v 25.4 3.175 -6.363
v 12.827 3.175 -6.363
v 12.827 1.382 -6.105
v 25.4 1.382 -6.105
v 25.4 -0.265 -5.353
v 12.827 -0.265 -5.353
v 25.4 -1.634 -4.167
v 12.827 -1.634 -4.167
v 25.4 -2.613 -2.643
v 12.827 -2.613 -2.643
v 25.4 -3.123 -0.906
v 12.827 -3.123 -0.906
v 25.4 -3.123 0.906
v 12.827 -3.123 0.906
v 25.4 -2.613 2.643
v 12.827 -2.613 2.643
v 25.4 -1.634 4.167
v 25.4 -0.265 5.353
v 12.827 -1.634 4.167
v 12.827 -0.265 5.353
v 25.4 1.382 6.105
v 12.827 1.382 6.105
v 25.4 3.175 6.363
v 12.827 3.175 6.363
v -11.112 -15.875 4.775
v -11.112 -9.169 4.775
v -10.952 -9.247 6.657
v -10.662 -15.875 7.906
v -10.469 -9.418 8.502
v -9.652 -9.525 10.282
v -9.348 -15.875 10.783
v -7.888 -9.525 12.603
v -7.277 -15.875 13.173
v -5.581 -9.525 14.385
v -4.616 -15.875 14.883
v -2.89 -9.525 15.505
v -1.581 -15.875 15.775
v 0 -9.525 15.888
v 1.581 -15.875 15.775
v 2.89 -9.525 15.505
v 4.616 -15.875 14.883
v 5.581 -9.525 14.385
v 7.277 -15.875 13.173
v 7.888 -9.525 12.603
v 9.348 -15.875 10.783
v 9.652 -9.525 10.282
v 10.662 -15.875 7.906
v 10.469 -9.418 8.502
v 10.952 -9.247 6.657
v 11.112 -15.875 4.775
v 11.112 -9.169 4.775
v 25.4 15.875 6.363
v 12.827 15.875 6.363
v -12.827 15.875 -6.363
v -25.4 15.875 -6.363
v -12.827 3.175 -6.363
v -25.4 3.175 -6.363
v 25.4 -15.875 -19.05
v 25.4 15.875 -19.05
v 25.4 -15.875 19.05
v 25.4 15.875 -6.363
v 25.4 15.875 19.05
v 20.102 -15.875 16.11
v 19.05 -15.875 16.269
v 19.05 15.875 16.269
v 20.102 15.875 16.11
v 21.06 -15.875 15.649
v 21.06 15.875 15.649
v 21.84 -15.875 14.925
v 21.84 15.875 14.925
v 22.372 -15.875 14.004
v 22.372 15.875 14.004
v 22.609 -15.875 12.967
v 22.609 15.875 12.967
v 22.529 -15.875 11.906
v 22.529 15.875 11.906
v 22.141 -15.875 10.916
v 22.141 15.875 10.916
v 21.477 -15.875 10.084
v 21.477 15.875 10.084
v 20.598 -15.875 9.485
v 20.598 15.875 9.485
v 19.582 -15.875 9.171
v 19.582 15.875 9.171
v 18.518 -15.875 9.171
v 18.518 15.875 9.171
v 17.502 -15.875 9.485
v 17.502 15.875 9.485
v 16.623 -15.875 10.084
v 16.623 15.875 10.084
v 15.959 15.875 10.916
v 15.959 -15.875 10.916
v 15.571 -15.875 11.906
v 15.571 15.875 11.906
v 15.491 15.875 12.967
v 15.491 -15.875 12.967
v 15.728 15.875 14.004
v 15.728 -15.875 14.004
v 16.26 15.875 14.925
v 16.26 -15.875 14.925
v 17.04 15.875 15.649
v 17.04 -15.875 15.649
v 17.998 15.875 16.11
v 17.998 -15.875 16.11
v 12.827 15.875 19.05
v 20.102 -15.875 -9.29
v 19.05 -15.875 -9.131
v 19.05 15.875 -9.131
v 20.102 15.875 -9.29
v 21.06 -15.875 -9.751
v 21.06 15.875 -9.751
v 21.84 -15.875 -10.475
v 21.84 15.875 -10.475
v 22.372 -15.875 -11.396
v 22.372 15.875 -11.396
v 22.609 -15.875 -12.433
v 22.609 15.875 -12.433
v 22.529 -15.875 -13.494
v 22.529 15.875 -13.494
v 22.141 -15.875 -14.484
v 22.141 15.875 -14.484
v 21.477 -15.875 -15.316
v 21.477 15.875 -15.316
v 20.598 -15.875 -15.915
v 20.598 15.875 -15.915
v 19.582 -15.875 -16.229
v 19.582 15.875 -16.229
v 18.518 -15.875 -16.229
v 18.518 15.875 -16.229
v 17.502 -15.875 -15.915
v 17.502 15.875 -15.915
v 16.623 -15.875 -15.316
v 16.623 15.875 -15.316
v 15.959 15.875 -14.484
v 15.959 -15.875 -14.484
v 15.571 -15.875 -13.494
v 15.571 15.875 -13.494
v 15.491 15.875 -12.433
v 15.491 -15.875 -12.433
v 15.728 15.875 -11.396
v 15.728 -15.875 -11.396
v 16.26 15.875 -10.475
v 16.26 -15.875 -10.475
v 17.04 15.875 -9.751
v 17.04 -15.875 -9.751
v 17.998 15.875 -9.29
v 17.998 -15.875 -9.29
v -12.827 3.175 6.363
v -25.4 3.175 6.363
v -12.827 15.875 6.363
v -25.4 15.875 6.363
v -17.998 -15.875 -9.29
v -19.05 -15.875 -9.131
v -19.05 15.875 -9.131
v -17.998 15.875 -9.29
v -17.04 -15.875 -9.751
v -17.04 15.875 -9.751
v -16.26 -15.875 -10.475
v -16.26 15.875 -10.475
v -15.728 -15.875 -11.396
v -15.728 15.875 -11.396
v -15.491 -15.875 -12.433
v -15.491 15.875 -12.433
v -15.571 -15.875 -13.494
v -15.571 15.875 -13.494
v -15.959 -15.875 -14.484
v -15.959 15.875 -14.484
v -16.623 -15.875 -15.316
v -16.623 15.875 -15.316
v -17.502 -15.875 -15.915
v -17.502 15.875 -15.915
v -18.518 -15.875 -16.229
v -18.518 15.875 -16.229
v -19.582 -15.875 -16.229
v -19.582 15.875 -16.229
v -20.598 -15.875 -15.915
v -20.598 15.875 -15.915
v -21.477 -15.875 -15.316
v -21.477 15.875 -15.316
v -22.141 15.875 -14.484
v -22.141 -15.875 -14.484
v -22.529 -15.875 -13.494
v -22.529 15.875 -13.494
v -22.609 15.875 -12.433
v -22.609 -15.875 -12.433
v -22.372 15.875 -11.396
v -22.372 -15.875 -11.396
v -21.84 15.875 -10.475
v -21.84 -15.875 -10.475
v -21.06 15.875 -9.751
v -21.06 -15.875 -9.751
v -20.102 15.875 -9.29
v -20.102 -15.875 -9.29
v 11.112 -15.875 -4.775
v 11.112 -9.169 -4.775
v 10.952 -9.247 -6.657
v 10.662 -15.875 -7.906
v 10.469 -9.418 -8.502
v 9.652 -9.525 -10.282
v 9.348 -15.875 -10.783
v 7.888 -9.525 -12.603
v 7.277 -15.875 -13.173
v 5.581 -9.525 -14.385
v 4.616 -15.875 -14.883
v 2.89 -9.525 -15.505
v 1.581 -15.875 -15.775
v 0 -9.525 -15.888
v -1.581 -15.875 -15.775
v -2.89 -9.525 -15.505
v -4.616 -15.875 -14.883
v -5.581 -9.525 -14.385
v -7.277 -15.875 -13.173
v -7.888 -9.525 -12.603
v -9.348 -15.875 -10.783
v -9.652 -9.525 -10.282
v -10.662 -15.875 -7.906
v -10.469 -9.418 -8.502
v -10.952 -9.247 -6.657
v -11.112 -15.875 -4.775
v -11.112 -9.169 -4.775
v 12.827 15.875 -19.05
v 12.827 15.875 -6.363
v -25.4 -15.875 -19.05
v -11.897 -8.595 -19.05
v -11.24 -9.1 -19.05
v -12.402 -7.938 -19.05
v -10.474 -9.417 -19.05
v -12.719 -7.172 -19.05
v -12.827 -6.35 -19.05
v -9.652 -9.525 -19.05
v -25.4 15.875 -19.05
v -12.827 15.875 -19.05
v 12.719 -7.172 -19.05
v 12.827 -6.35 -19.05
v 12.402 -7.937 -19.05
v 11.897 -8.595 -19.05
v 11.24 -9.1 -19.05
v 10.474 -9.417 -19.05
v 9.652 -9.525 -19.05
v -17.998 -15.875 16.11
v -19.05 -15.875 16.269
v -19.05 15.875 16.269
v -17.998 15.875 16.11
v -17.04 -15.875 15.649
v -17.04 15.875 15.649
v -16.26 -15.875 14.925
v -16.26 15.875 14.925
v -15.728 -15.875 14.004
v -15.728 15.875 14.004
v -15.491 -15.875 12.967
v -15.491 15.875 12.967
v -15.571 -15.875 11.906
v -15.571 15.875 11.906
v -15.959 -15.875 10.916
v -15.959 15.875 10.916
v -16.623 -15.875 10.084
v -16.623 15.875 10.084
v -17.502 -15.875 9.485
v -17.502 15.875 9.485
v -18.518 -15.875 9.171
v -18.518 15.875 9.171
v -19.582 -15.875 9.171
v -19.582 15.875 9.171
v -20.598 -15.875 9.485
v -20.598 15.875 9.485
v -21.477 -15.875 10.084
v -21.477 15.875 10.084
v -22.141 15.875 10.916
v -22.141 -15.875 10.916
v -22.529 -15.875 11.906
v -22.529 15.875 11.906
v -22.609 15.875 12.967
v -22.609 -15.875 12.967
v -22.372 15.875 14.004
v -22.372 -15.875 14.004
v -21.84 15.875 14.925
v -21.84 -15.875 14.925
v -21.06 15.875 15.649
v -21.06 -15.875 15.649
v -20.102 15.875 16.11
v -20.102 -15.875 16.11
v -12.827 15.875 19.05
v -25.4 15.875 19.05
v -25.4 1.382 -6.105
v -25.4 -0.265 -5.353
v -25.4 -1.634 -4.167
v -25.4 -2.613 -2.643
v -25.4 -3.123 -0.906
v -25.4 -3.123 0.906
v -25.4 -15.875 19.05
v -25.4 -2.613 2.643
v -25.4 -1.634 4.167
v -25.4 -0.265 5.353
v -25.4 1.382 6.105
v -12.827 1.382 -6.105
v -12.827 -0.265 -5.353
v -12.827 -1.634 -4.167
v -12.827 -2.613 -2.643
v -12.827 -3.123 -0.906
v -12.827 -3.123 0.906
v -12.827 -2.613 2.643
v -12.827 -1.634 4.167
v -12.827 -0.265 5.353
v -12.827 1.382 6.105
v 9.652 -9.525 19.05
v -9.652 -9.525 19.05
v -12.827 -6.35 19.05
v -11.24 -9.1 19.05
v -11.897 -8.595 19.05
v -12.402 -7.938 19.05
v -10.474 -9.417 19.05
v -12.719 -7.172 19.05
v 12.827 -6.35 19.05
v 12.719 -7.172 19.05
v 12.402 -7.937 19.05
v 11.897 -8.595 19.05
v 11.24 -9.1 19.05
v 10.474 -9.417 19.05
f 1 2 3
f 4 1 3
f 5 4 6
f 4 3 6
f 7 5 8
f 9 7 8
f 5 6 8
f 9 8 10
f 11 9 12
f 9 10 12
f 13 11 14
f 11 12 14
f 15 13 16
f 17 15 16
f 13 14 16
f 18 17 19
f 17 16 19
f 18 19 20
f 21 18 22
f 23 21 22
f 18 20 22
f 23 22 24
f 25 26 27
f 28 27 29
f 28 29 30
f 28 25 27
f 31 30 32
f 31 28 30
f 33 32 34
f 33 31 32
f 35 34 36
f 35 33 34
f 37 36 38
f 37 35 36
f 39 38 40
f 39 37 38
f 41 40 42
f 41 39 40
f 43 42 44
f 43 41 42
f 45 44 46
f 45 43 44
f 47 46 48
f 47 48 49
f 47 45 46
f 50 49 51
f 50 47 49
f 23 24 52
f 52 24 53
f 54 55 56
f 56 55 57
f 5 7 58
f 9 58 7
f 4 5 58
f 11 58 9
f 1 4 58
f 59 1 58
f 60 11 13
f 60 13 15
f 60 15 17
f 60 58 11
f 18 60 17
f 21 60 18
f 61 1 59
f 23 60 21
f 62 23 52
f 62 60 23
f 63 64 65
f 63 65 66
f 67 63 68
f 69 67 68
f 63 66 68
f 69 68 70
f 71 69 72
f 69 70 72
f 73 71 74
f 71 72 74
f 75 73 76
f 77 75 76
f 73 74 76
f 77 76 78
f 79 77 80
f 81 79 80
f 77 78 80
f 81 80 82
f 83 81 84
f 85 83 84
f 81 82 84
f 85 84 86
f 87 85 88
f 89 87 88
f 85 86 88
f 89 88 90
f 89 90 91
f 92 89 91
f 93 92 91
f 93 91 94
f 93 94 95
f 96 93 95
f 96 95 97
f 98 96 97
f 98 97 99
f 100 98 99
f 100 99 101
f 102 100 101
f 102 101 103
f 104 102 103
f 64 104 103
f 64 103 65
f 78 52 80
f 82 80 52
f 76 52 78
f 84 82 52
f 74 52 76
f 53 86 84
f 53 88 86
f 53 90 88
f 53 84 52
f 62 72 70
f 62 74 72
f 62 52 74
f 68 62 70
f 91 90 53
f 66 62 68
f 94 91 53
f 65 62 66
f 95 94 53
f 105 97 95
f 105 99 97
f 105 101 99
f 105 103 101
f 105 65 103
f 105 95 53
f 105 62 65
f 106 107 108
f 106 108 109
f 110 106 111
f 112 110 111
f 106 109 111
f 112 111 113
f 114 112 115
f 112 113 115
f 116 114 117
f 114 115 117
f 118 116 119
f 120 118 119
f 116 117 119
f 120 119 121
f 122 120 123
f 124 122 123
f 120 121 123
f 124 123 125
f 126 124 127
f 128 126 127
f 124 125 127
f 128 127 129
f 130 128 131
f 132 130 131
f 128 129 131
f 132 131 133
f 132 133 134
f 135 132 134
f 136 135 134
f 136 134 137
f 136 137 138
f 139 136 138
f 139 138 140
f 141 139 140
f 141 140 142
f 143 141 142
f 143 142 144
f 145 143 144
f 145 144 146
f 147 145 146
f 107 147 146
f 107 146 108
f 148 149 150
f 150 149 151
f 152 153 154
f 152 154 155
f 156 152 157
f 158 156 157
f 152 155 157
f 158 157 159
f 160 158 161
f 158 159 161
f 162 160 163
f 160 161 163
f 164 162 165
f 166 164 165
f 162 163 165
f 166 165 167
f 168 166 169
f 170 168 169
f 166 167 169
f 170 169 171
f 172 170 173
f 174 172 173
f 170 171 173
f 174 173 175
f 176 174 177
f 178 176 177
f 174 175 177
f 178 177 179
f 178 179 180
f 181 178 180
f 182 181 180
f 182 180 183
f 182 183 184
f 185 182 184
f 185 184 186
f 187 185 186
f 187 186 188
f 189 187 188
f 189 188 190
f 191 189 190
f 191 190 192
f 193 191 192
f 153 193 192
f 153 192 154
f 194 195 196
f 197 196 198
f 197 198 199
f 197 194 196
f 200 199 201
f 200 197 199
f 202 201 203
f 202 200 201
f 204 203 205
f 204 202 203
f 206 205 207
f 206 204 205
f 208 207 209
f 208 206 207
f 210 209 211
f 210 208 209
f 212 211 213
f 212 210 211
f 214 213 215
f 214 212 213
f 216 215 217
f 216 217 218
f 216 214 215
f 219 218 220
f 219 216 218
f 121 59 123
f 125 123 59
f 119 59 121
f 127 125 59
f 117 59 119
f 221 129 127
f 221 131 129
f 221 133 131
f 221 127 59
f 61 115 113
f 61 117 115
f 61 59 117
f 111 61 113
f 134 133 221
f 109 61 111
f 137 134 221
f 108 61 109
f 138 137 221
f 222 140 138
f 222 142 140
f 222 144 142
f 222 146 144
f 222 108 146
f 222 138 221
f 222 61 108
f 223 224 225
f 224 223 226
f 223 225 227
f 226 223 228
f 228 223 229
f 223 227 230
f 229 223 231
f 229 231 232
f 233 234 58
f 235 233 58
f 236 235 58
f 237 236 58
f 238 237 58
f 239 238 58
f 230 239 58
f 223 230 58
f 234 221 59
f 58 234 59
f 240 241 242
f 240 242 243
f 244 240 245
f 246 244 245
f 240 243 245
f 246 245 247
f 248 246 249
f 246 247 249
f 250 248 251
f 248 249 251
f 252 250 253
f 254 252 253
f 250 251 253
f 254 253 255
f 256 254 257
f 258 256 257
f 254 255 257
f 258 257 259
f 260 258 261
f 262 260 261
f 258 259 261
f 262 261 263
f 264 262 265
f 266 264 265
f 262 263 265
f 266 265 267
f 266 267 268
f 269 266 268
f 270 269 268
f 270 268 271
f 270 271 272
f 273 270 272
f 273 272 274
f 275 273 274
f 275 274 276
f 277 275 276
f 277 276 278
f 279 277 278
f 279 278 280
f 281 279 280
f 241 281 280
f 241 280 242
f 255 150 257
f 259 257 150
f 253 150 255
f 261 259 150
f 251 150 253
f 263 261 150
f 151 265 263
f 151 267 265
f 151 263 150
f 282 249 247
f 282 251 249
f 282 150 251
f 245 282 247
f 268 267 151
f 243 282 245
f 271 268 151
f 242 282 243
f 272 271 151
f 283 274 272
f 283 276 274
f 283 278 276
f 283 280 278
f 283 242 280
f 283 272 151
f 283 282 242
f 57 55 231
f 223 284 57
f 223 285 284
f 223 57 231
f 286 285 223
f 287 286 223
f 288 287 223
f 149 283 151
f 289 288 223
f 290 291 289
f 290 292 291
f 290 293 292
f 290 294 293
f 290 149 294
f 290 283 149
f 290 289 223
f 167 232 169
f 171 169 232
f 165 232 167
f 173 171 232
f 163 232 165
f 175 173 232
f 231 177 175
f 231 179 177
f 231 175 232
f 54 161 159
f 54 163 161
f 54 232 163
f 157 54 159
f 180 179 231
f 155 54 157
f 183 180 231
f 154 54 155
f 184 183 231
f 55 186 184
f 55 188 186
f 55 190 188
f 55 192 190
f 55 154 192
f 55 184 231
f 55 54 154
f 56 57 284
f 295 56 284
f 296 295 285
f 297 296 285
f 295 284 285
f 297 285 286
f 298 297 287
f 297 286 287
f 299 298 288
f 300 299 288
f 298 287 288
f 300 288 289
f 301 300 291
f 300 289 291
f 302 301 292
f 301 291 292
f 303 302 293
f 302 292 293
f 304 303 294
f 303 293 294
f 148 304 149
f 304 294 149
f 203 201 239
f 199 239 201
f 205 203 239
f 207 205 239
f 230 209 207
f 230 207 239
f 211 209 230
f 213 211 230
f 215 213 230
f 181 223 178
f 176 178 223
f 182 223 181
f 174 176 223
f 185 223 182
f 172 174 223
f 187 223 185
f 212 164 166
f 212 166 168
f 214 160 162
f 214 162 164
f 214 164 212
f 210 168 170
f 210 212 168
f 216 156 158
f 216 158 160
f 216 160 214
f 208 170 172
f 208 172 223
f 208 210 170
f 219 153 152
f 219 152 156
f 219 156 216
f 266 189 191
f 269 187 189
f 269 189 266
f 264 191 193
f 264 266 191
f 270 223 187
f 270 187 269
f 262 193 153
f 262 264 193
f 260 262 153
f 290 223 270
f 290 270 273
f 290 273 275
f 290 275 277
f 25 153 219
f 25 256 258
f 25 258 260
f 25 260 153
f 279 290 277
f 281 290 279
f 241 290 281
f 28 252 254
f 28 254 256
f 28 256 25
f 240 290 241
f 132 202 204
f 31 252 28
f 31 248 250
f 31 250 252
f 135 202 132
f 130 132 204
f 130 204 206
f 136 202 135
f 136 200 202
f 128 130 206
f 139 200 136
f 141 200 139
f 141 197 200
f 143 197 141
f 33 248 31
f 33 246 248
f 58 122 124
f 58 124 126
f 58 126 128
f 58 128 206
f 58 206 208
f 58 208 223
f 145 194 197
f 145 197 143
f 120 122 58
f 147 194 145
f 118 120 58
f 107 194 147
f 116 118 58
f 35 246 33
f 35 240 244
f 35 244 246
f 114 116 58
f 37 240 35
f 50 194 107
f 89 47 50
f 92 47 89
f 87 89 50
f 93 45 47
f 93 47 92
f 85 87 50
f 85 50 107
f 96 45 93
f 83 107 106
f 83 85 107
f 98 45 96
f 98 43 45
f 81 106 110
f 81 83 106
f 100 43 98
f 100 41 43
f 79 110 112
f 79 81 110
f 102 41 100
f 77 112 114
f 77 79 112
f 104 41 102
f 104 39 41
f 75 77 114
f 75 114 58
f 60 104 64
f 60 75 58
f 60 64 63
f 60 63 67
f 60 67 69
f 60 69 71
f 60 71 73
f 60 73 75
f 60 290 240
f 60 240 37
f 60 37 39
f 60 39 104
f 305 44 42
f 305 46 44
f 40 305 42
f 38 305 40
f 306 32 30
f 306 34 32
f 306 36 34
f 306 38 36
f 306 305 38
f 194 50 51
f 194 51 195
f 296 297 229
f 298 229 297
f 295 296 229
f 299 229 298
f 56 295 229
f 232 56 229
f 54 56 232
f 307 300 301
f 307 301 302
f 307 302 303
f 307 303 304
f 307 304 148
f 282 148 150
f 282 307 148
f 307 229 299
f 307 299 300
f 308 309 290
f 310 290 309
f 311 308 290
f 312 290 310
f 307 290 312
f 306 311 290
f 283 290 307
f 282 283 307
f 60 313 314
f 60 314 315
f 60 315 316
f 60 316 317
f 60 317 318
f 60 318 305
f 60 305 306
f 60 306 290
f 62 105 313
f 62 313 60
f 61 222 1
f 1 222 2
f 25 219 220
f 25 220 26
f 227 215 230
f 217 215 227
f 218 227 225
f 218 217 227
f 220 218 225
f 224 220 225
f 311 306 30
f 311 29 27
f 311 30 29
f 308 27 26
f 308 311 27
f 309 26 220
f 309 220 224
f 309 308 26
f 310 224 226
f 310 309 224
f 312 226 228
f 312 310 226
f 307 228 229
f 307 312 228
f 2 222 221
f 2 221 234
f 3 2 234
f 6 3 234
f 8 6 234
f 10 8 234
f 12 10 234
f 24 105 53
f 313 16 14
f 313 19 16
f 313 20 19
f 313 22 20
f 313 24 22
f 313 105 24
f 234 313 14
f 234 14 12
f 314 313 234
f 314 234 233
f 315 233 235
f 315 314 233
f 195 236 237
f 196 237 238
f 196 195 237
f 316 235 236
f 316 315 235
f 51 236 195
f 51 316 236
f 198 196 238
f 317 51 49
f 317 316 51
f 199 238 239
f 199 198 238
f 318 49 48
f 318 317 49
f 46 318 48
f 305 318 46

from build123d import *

# Parameters (mm, degrees)
EXTRUDE1_DEPTH          = 19.05
CUT_EXTRUDE1_DEPTH      = 51.8
FILLET1_R               = 3.175
CUT_EXTRUDE2_DEPTH      = 2.54
CUT_EXTRUDE2_DEPTH_BACK = 7.35
SKETCH4_R               = 3.5687
CUT_EXTRUDE3_DEPTH      = 32.7500001


with BuildPart() as part:
    # Sketch1 → Extrude1 (new body, symmetric)
    with BuildSketch(Plane.XY):
        Polygon((25.4, 15.875), (12.827, 15.875), (12.827, -9.525), (-12.827, -9.525), (-12.827, 15.875), (-25.4, 15.875), (-25.4, -15.875), (25.4, -15.875), align=None)
    extrude(amount=EXTRUDE1_DEPTH, both=True)

    # Sketch2 → Cut-Extrude1 (cut, through all)
    with BuildSketch(Plane.ZY.offset(25.4)):
        with BuildLine():
            Line((-6.3627, 15.875), (-6.3627, 3.175))
            ThreePointArc((-6.3627, 3.175), (0, -3.1877), (6.3627, 3.175))
            Line((6.3627, 3.175), (6.3627, 15.875))
            Line((6.3627, 15.875), (-6.3627, 15.875))
        make_face()
    extrude(amount=-CUT_EXTRUDE1_DEPTH, mode=Mode.SUBTRACT)

    # Fillet1
    fillet1_edges = [part.edges().sort_by_distance(p)[0] for p in [
        (-12.827, -9.525, 0),
        (12.827, -9.525, 0),
    ]]
    fillet(fillet1_edges, radius=FILLET1_R)

    # Sketch3 → Cut-Extrude2 (cut, two sides)
    with BuildSketch(Plane(origin=(0, -9.525, 0), x_dir=(-1, 0, 0), z_dir=(0, 1, 0))) as cut_extrude2_sk:
        with BuildLine():
            Line((-11.1125, 4.7752), (-11.1125, -4.7752))
            ThreePointArc((-11.1125, -4.7752), (0, -15.8877), (11.1125, -4.7752))
            Line((11.1125, -4.7752), (11.1125, 4.7752))
            ThreePointArc((11.1125, 4.7752), (0, 15.8877), (-11.1125, 4.7752))
        make_face()
    extrude(amount=CUT_EXTRUDE2_DEPTH, mode=Mode.SUBTRACT)
    extrude(cut_extrude2_sk.sketch, amount=-CUT_EXTRUDE2_DEPTH_BACK, mode=Mode.SUBTRACT)

    # Sketch4 → Cut-Extrude3 (cut, through all)
    with BuildSketch(Plane(origin=(0, 15.875, 0), x_dir=(-1, 0, 0), z_dir=(0, 1, 0))):
        with Locations(Location((-19.05, -12.7, 0), (0, 0, 90))):  # turned: the seam where the file's is
            Circle(SKETCH4_R)
        with Locations(Location((-19.05, 12.7, 0), (0, 0, 90))):  # turned: the seam where the file's is
            Circle(SKETCH4_R)
        with Locations(Location((19.05, 12.7, 0), (0, 0, 90))):  # turned: the seam where the file's is
            Circle(SKETCH4_R)
        with Locations(Location((19.05, -12.7, 0), (0, 0, 90))):  # turned: the seam where the file's is
            Circle(SKETCH4_R)
    extrude(amount=-CUT_EXTRUDE3_DEPTH, mode=Mode.SUBTRACT)


solid = part.part
